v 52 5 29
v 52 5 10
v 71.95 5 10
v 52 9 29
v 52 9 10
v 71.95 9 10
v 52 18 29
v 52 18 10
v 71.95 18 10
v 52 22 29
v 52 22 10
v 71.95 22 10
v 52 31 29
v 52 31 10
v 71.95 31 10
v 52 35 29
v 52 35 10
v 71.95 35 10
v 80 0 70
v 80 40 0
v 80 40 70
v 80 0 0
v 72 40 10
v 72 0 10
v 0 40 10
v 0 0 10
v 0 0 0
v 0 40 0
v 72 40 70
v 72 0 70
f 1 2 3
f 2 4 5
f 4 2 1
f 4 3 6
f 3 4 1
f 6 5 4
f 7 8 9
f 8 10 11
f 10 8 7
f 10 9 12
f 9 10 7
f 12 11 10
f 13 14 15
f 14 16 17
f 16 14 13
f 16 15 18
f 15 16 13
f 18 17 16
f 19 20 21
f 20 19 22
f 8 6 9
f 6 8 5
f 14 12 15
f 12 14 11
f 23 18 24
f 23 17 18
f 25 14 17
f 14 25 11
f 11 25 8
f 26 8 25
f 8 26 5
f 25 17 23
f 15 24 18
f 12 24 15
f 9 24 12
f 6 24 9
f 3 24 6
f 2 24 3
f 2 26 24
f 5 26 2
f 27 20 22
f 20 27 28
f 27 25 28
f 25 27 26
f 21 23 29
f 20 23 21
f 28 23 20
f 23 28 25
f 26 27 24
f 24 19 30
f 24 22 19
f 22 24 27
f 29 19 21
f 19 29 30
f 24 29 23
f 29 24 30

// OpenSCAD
$fn = 32;

// ----------------------------------------------------------------------
// Rib bracket: 3-gusset L bracket
// ----------------------------------------------------------------------

// --- parameters (mm) ---
base_l = 80;              // foot length, X
base_w = 40;              // foot width, Y
base_t = 10;              // foot thickness
plate_t = 8;              // upright plate thickness
plate_h = 70;             // overall height
gus_l = 20;               // gusset leg along the foot
gus_h = 20;               // gusset height
gus_t = 4;                // gusset thickness
gus_edge = 5;             // gusset margin from the foot edge
n_gus = 3;                // gusset count

gus_pitch = (base_w - 2 * gus_edge - gus_t) / (n_gus - 1);  // gusset pitch

union() {
  cube([base_l, base_w, base_t]);
  translate([base_l - plate_t, 0, base_t - 1])
    cube([plate_t, base_w, plate_h - base_t + 1]);
  for (i = [0 : n_gus - 1])
    translate([base_l - plate_t - gus_l, gus_edge + i * gus_pitch, base_t - 1])
      rotate([-90, 0, 0])
        linear_extrude(height = gus_t)
          polygon(points = [[0, 0], [gus_l + 1, 0], [0, -gus_h]]);
}
